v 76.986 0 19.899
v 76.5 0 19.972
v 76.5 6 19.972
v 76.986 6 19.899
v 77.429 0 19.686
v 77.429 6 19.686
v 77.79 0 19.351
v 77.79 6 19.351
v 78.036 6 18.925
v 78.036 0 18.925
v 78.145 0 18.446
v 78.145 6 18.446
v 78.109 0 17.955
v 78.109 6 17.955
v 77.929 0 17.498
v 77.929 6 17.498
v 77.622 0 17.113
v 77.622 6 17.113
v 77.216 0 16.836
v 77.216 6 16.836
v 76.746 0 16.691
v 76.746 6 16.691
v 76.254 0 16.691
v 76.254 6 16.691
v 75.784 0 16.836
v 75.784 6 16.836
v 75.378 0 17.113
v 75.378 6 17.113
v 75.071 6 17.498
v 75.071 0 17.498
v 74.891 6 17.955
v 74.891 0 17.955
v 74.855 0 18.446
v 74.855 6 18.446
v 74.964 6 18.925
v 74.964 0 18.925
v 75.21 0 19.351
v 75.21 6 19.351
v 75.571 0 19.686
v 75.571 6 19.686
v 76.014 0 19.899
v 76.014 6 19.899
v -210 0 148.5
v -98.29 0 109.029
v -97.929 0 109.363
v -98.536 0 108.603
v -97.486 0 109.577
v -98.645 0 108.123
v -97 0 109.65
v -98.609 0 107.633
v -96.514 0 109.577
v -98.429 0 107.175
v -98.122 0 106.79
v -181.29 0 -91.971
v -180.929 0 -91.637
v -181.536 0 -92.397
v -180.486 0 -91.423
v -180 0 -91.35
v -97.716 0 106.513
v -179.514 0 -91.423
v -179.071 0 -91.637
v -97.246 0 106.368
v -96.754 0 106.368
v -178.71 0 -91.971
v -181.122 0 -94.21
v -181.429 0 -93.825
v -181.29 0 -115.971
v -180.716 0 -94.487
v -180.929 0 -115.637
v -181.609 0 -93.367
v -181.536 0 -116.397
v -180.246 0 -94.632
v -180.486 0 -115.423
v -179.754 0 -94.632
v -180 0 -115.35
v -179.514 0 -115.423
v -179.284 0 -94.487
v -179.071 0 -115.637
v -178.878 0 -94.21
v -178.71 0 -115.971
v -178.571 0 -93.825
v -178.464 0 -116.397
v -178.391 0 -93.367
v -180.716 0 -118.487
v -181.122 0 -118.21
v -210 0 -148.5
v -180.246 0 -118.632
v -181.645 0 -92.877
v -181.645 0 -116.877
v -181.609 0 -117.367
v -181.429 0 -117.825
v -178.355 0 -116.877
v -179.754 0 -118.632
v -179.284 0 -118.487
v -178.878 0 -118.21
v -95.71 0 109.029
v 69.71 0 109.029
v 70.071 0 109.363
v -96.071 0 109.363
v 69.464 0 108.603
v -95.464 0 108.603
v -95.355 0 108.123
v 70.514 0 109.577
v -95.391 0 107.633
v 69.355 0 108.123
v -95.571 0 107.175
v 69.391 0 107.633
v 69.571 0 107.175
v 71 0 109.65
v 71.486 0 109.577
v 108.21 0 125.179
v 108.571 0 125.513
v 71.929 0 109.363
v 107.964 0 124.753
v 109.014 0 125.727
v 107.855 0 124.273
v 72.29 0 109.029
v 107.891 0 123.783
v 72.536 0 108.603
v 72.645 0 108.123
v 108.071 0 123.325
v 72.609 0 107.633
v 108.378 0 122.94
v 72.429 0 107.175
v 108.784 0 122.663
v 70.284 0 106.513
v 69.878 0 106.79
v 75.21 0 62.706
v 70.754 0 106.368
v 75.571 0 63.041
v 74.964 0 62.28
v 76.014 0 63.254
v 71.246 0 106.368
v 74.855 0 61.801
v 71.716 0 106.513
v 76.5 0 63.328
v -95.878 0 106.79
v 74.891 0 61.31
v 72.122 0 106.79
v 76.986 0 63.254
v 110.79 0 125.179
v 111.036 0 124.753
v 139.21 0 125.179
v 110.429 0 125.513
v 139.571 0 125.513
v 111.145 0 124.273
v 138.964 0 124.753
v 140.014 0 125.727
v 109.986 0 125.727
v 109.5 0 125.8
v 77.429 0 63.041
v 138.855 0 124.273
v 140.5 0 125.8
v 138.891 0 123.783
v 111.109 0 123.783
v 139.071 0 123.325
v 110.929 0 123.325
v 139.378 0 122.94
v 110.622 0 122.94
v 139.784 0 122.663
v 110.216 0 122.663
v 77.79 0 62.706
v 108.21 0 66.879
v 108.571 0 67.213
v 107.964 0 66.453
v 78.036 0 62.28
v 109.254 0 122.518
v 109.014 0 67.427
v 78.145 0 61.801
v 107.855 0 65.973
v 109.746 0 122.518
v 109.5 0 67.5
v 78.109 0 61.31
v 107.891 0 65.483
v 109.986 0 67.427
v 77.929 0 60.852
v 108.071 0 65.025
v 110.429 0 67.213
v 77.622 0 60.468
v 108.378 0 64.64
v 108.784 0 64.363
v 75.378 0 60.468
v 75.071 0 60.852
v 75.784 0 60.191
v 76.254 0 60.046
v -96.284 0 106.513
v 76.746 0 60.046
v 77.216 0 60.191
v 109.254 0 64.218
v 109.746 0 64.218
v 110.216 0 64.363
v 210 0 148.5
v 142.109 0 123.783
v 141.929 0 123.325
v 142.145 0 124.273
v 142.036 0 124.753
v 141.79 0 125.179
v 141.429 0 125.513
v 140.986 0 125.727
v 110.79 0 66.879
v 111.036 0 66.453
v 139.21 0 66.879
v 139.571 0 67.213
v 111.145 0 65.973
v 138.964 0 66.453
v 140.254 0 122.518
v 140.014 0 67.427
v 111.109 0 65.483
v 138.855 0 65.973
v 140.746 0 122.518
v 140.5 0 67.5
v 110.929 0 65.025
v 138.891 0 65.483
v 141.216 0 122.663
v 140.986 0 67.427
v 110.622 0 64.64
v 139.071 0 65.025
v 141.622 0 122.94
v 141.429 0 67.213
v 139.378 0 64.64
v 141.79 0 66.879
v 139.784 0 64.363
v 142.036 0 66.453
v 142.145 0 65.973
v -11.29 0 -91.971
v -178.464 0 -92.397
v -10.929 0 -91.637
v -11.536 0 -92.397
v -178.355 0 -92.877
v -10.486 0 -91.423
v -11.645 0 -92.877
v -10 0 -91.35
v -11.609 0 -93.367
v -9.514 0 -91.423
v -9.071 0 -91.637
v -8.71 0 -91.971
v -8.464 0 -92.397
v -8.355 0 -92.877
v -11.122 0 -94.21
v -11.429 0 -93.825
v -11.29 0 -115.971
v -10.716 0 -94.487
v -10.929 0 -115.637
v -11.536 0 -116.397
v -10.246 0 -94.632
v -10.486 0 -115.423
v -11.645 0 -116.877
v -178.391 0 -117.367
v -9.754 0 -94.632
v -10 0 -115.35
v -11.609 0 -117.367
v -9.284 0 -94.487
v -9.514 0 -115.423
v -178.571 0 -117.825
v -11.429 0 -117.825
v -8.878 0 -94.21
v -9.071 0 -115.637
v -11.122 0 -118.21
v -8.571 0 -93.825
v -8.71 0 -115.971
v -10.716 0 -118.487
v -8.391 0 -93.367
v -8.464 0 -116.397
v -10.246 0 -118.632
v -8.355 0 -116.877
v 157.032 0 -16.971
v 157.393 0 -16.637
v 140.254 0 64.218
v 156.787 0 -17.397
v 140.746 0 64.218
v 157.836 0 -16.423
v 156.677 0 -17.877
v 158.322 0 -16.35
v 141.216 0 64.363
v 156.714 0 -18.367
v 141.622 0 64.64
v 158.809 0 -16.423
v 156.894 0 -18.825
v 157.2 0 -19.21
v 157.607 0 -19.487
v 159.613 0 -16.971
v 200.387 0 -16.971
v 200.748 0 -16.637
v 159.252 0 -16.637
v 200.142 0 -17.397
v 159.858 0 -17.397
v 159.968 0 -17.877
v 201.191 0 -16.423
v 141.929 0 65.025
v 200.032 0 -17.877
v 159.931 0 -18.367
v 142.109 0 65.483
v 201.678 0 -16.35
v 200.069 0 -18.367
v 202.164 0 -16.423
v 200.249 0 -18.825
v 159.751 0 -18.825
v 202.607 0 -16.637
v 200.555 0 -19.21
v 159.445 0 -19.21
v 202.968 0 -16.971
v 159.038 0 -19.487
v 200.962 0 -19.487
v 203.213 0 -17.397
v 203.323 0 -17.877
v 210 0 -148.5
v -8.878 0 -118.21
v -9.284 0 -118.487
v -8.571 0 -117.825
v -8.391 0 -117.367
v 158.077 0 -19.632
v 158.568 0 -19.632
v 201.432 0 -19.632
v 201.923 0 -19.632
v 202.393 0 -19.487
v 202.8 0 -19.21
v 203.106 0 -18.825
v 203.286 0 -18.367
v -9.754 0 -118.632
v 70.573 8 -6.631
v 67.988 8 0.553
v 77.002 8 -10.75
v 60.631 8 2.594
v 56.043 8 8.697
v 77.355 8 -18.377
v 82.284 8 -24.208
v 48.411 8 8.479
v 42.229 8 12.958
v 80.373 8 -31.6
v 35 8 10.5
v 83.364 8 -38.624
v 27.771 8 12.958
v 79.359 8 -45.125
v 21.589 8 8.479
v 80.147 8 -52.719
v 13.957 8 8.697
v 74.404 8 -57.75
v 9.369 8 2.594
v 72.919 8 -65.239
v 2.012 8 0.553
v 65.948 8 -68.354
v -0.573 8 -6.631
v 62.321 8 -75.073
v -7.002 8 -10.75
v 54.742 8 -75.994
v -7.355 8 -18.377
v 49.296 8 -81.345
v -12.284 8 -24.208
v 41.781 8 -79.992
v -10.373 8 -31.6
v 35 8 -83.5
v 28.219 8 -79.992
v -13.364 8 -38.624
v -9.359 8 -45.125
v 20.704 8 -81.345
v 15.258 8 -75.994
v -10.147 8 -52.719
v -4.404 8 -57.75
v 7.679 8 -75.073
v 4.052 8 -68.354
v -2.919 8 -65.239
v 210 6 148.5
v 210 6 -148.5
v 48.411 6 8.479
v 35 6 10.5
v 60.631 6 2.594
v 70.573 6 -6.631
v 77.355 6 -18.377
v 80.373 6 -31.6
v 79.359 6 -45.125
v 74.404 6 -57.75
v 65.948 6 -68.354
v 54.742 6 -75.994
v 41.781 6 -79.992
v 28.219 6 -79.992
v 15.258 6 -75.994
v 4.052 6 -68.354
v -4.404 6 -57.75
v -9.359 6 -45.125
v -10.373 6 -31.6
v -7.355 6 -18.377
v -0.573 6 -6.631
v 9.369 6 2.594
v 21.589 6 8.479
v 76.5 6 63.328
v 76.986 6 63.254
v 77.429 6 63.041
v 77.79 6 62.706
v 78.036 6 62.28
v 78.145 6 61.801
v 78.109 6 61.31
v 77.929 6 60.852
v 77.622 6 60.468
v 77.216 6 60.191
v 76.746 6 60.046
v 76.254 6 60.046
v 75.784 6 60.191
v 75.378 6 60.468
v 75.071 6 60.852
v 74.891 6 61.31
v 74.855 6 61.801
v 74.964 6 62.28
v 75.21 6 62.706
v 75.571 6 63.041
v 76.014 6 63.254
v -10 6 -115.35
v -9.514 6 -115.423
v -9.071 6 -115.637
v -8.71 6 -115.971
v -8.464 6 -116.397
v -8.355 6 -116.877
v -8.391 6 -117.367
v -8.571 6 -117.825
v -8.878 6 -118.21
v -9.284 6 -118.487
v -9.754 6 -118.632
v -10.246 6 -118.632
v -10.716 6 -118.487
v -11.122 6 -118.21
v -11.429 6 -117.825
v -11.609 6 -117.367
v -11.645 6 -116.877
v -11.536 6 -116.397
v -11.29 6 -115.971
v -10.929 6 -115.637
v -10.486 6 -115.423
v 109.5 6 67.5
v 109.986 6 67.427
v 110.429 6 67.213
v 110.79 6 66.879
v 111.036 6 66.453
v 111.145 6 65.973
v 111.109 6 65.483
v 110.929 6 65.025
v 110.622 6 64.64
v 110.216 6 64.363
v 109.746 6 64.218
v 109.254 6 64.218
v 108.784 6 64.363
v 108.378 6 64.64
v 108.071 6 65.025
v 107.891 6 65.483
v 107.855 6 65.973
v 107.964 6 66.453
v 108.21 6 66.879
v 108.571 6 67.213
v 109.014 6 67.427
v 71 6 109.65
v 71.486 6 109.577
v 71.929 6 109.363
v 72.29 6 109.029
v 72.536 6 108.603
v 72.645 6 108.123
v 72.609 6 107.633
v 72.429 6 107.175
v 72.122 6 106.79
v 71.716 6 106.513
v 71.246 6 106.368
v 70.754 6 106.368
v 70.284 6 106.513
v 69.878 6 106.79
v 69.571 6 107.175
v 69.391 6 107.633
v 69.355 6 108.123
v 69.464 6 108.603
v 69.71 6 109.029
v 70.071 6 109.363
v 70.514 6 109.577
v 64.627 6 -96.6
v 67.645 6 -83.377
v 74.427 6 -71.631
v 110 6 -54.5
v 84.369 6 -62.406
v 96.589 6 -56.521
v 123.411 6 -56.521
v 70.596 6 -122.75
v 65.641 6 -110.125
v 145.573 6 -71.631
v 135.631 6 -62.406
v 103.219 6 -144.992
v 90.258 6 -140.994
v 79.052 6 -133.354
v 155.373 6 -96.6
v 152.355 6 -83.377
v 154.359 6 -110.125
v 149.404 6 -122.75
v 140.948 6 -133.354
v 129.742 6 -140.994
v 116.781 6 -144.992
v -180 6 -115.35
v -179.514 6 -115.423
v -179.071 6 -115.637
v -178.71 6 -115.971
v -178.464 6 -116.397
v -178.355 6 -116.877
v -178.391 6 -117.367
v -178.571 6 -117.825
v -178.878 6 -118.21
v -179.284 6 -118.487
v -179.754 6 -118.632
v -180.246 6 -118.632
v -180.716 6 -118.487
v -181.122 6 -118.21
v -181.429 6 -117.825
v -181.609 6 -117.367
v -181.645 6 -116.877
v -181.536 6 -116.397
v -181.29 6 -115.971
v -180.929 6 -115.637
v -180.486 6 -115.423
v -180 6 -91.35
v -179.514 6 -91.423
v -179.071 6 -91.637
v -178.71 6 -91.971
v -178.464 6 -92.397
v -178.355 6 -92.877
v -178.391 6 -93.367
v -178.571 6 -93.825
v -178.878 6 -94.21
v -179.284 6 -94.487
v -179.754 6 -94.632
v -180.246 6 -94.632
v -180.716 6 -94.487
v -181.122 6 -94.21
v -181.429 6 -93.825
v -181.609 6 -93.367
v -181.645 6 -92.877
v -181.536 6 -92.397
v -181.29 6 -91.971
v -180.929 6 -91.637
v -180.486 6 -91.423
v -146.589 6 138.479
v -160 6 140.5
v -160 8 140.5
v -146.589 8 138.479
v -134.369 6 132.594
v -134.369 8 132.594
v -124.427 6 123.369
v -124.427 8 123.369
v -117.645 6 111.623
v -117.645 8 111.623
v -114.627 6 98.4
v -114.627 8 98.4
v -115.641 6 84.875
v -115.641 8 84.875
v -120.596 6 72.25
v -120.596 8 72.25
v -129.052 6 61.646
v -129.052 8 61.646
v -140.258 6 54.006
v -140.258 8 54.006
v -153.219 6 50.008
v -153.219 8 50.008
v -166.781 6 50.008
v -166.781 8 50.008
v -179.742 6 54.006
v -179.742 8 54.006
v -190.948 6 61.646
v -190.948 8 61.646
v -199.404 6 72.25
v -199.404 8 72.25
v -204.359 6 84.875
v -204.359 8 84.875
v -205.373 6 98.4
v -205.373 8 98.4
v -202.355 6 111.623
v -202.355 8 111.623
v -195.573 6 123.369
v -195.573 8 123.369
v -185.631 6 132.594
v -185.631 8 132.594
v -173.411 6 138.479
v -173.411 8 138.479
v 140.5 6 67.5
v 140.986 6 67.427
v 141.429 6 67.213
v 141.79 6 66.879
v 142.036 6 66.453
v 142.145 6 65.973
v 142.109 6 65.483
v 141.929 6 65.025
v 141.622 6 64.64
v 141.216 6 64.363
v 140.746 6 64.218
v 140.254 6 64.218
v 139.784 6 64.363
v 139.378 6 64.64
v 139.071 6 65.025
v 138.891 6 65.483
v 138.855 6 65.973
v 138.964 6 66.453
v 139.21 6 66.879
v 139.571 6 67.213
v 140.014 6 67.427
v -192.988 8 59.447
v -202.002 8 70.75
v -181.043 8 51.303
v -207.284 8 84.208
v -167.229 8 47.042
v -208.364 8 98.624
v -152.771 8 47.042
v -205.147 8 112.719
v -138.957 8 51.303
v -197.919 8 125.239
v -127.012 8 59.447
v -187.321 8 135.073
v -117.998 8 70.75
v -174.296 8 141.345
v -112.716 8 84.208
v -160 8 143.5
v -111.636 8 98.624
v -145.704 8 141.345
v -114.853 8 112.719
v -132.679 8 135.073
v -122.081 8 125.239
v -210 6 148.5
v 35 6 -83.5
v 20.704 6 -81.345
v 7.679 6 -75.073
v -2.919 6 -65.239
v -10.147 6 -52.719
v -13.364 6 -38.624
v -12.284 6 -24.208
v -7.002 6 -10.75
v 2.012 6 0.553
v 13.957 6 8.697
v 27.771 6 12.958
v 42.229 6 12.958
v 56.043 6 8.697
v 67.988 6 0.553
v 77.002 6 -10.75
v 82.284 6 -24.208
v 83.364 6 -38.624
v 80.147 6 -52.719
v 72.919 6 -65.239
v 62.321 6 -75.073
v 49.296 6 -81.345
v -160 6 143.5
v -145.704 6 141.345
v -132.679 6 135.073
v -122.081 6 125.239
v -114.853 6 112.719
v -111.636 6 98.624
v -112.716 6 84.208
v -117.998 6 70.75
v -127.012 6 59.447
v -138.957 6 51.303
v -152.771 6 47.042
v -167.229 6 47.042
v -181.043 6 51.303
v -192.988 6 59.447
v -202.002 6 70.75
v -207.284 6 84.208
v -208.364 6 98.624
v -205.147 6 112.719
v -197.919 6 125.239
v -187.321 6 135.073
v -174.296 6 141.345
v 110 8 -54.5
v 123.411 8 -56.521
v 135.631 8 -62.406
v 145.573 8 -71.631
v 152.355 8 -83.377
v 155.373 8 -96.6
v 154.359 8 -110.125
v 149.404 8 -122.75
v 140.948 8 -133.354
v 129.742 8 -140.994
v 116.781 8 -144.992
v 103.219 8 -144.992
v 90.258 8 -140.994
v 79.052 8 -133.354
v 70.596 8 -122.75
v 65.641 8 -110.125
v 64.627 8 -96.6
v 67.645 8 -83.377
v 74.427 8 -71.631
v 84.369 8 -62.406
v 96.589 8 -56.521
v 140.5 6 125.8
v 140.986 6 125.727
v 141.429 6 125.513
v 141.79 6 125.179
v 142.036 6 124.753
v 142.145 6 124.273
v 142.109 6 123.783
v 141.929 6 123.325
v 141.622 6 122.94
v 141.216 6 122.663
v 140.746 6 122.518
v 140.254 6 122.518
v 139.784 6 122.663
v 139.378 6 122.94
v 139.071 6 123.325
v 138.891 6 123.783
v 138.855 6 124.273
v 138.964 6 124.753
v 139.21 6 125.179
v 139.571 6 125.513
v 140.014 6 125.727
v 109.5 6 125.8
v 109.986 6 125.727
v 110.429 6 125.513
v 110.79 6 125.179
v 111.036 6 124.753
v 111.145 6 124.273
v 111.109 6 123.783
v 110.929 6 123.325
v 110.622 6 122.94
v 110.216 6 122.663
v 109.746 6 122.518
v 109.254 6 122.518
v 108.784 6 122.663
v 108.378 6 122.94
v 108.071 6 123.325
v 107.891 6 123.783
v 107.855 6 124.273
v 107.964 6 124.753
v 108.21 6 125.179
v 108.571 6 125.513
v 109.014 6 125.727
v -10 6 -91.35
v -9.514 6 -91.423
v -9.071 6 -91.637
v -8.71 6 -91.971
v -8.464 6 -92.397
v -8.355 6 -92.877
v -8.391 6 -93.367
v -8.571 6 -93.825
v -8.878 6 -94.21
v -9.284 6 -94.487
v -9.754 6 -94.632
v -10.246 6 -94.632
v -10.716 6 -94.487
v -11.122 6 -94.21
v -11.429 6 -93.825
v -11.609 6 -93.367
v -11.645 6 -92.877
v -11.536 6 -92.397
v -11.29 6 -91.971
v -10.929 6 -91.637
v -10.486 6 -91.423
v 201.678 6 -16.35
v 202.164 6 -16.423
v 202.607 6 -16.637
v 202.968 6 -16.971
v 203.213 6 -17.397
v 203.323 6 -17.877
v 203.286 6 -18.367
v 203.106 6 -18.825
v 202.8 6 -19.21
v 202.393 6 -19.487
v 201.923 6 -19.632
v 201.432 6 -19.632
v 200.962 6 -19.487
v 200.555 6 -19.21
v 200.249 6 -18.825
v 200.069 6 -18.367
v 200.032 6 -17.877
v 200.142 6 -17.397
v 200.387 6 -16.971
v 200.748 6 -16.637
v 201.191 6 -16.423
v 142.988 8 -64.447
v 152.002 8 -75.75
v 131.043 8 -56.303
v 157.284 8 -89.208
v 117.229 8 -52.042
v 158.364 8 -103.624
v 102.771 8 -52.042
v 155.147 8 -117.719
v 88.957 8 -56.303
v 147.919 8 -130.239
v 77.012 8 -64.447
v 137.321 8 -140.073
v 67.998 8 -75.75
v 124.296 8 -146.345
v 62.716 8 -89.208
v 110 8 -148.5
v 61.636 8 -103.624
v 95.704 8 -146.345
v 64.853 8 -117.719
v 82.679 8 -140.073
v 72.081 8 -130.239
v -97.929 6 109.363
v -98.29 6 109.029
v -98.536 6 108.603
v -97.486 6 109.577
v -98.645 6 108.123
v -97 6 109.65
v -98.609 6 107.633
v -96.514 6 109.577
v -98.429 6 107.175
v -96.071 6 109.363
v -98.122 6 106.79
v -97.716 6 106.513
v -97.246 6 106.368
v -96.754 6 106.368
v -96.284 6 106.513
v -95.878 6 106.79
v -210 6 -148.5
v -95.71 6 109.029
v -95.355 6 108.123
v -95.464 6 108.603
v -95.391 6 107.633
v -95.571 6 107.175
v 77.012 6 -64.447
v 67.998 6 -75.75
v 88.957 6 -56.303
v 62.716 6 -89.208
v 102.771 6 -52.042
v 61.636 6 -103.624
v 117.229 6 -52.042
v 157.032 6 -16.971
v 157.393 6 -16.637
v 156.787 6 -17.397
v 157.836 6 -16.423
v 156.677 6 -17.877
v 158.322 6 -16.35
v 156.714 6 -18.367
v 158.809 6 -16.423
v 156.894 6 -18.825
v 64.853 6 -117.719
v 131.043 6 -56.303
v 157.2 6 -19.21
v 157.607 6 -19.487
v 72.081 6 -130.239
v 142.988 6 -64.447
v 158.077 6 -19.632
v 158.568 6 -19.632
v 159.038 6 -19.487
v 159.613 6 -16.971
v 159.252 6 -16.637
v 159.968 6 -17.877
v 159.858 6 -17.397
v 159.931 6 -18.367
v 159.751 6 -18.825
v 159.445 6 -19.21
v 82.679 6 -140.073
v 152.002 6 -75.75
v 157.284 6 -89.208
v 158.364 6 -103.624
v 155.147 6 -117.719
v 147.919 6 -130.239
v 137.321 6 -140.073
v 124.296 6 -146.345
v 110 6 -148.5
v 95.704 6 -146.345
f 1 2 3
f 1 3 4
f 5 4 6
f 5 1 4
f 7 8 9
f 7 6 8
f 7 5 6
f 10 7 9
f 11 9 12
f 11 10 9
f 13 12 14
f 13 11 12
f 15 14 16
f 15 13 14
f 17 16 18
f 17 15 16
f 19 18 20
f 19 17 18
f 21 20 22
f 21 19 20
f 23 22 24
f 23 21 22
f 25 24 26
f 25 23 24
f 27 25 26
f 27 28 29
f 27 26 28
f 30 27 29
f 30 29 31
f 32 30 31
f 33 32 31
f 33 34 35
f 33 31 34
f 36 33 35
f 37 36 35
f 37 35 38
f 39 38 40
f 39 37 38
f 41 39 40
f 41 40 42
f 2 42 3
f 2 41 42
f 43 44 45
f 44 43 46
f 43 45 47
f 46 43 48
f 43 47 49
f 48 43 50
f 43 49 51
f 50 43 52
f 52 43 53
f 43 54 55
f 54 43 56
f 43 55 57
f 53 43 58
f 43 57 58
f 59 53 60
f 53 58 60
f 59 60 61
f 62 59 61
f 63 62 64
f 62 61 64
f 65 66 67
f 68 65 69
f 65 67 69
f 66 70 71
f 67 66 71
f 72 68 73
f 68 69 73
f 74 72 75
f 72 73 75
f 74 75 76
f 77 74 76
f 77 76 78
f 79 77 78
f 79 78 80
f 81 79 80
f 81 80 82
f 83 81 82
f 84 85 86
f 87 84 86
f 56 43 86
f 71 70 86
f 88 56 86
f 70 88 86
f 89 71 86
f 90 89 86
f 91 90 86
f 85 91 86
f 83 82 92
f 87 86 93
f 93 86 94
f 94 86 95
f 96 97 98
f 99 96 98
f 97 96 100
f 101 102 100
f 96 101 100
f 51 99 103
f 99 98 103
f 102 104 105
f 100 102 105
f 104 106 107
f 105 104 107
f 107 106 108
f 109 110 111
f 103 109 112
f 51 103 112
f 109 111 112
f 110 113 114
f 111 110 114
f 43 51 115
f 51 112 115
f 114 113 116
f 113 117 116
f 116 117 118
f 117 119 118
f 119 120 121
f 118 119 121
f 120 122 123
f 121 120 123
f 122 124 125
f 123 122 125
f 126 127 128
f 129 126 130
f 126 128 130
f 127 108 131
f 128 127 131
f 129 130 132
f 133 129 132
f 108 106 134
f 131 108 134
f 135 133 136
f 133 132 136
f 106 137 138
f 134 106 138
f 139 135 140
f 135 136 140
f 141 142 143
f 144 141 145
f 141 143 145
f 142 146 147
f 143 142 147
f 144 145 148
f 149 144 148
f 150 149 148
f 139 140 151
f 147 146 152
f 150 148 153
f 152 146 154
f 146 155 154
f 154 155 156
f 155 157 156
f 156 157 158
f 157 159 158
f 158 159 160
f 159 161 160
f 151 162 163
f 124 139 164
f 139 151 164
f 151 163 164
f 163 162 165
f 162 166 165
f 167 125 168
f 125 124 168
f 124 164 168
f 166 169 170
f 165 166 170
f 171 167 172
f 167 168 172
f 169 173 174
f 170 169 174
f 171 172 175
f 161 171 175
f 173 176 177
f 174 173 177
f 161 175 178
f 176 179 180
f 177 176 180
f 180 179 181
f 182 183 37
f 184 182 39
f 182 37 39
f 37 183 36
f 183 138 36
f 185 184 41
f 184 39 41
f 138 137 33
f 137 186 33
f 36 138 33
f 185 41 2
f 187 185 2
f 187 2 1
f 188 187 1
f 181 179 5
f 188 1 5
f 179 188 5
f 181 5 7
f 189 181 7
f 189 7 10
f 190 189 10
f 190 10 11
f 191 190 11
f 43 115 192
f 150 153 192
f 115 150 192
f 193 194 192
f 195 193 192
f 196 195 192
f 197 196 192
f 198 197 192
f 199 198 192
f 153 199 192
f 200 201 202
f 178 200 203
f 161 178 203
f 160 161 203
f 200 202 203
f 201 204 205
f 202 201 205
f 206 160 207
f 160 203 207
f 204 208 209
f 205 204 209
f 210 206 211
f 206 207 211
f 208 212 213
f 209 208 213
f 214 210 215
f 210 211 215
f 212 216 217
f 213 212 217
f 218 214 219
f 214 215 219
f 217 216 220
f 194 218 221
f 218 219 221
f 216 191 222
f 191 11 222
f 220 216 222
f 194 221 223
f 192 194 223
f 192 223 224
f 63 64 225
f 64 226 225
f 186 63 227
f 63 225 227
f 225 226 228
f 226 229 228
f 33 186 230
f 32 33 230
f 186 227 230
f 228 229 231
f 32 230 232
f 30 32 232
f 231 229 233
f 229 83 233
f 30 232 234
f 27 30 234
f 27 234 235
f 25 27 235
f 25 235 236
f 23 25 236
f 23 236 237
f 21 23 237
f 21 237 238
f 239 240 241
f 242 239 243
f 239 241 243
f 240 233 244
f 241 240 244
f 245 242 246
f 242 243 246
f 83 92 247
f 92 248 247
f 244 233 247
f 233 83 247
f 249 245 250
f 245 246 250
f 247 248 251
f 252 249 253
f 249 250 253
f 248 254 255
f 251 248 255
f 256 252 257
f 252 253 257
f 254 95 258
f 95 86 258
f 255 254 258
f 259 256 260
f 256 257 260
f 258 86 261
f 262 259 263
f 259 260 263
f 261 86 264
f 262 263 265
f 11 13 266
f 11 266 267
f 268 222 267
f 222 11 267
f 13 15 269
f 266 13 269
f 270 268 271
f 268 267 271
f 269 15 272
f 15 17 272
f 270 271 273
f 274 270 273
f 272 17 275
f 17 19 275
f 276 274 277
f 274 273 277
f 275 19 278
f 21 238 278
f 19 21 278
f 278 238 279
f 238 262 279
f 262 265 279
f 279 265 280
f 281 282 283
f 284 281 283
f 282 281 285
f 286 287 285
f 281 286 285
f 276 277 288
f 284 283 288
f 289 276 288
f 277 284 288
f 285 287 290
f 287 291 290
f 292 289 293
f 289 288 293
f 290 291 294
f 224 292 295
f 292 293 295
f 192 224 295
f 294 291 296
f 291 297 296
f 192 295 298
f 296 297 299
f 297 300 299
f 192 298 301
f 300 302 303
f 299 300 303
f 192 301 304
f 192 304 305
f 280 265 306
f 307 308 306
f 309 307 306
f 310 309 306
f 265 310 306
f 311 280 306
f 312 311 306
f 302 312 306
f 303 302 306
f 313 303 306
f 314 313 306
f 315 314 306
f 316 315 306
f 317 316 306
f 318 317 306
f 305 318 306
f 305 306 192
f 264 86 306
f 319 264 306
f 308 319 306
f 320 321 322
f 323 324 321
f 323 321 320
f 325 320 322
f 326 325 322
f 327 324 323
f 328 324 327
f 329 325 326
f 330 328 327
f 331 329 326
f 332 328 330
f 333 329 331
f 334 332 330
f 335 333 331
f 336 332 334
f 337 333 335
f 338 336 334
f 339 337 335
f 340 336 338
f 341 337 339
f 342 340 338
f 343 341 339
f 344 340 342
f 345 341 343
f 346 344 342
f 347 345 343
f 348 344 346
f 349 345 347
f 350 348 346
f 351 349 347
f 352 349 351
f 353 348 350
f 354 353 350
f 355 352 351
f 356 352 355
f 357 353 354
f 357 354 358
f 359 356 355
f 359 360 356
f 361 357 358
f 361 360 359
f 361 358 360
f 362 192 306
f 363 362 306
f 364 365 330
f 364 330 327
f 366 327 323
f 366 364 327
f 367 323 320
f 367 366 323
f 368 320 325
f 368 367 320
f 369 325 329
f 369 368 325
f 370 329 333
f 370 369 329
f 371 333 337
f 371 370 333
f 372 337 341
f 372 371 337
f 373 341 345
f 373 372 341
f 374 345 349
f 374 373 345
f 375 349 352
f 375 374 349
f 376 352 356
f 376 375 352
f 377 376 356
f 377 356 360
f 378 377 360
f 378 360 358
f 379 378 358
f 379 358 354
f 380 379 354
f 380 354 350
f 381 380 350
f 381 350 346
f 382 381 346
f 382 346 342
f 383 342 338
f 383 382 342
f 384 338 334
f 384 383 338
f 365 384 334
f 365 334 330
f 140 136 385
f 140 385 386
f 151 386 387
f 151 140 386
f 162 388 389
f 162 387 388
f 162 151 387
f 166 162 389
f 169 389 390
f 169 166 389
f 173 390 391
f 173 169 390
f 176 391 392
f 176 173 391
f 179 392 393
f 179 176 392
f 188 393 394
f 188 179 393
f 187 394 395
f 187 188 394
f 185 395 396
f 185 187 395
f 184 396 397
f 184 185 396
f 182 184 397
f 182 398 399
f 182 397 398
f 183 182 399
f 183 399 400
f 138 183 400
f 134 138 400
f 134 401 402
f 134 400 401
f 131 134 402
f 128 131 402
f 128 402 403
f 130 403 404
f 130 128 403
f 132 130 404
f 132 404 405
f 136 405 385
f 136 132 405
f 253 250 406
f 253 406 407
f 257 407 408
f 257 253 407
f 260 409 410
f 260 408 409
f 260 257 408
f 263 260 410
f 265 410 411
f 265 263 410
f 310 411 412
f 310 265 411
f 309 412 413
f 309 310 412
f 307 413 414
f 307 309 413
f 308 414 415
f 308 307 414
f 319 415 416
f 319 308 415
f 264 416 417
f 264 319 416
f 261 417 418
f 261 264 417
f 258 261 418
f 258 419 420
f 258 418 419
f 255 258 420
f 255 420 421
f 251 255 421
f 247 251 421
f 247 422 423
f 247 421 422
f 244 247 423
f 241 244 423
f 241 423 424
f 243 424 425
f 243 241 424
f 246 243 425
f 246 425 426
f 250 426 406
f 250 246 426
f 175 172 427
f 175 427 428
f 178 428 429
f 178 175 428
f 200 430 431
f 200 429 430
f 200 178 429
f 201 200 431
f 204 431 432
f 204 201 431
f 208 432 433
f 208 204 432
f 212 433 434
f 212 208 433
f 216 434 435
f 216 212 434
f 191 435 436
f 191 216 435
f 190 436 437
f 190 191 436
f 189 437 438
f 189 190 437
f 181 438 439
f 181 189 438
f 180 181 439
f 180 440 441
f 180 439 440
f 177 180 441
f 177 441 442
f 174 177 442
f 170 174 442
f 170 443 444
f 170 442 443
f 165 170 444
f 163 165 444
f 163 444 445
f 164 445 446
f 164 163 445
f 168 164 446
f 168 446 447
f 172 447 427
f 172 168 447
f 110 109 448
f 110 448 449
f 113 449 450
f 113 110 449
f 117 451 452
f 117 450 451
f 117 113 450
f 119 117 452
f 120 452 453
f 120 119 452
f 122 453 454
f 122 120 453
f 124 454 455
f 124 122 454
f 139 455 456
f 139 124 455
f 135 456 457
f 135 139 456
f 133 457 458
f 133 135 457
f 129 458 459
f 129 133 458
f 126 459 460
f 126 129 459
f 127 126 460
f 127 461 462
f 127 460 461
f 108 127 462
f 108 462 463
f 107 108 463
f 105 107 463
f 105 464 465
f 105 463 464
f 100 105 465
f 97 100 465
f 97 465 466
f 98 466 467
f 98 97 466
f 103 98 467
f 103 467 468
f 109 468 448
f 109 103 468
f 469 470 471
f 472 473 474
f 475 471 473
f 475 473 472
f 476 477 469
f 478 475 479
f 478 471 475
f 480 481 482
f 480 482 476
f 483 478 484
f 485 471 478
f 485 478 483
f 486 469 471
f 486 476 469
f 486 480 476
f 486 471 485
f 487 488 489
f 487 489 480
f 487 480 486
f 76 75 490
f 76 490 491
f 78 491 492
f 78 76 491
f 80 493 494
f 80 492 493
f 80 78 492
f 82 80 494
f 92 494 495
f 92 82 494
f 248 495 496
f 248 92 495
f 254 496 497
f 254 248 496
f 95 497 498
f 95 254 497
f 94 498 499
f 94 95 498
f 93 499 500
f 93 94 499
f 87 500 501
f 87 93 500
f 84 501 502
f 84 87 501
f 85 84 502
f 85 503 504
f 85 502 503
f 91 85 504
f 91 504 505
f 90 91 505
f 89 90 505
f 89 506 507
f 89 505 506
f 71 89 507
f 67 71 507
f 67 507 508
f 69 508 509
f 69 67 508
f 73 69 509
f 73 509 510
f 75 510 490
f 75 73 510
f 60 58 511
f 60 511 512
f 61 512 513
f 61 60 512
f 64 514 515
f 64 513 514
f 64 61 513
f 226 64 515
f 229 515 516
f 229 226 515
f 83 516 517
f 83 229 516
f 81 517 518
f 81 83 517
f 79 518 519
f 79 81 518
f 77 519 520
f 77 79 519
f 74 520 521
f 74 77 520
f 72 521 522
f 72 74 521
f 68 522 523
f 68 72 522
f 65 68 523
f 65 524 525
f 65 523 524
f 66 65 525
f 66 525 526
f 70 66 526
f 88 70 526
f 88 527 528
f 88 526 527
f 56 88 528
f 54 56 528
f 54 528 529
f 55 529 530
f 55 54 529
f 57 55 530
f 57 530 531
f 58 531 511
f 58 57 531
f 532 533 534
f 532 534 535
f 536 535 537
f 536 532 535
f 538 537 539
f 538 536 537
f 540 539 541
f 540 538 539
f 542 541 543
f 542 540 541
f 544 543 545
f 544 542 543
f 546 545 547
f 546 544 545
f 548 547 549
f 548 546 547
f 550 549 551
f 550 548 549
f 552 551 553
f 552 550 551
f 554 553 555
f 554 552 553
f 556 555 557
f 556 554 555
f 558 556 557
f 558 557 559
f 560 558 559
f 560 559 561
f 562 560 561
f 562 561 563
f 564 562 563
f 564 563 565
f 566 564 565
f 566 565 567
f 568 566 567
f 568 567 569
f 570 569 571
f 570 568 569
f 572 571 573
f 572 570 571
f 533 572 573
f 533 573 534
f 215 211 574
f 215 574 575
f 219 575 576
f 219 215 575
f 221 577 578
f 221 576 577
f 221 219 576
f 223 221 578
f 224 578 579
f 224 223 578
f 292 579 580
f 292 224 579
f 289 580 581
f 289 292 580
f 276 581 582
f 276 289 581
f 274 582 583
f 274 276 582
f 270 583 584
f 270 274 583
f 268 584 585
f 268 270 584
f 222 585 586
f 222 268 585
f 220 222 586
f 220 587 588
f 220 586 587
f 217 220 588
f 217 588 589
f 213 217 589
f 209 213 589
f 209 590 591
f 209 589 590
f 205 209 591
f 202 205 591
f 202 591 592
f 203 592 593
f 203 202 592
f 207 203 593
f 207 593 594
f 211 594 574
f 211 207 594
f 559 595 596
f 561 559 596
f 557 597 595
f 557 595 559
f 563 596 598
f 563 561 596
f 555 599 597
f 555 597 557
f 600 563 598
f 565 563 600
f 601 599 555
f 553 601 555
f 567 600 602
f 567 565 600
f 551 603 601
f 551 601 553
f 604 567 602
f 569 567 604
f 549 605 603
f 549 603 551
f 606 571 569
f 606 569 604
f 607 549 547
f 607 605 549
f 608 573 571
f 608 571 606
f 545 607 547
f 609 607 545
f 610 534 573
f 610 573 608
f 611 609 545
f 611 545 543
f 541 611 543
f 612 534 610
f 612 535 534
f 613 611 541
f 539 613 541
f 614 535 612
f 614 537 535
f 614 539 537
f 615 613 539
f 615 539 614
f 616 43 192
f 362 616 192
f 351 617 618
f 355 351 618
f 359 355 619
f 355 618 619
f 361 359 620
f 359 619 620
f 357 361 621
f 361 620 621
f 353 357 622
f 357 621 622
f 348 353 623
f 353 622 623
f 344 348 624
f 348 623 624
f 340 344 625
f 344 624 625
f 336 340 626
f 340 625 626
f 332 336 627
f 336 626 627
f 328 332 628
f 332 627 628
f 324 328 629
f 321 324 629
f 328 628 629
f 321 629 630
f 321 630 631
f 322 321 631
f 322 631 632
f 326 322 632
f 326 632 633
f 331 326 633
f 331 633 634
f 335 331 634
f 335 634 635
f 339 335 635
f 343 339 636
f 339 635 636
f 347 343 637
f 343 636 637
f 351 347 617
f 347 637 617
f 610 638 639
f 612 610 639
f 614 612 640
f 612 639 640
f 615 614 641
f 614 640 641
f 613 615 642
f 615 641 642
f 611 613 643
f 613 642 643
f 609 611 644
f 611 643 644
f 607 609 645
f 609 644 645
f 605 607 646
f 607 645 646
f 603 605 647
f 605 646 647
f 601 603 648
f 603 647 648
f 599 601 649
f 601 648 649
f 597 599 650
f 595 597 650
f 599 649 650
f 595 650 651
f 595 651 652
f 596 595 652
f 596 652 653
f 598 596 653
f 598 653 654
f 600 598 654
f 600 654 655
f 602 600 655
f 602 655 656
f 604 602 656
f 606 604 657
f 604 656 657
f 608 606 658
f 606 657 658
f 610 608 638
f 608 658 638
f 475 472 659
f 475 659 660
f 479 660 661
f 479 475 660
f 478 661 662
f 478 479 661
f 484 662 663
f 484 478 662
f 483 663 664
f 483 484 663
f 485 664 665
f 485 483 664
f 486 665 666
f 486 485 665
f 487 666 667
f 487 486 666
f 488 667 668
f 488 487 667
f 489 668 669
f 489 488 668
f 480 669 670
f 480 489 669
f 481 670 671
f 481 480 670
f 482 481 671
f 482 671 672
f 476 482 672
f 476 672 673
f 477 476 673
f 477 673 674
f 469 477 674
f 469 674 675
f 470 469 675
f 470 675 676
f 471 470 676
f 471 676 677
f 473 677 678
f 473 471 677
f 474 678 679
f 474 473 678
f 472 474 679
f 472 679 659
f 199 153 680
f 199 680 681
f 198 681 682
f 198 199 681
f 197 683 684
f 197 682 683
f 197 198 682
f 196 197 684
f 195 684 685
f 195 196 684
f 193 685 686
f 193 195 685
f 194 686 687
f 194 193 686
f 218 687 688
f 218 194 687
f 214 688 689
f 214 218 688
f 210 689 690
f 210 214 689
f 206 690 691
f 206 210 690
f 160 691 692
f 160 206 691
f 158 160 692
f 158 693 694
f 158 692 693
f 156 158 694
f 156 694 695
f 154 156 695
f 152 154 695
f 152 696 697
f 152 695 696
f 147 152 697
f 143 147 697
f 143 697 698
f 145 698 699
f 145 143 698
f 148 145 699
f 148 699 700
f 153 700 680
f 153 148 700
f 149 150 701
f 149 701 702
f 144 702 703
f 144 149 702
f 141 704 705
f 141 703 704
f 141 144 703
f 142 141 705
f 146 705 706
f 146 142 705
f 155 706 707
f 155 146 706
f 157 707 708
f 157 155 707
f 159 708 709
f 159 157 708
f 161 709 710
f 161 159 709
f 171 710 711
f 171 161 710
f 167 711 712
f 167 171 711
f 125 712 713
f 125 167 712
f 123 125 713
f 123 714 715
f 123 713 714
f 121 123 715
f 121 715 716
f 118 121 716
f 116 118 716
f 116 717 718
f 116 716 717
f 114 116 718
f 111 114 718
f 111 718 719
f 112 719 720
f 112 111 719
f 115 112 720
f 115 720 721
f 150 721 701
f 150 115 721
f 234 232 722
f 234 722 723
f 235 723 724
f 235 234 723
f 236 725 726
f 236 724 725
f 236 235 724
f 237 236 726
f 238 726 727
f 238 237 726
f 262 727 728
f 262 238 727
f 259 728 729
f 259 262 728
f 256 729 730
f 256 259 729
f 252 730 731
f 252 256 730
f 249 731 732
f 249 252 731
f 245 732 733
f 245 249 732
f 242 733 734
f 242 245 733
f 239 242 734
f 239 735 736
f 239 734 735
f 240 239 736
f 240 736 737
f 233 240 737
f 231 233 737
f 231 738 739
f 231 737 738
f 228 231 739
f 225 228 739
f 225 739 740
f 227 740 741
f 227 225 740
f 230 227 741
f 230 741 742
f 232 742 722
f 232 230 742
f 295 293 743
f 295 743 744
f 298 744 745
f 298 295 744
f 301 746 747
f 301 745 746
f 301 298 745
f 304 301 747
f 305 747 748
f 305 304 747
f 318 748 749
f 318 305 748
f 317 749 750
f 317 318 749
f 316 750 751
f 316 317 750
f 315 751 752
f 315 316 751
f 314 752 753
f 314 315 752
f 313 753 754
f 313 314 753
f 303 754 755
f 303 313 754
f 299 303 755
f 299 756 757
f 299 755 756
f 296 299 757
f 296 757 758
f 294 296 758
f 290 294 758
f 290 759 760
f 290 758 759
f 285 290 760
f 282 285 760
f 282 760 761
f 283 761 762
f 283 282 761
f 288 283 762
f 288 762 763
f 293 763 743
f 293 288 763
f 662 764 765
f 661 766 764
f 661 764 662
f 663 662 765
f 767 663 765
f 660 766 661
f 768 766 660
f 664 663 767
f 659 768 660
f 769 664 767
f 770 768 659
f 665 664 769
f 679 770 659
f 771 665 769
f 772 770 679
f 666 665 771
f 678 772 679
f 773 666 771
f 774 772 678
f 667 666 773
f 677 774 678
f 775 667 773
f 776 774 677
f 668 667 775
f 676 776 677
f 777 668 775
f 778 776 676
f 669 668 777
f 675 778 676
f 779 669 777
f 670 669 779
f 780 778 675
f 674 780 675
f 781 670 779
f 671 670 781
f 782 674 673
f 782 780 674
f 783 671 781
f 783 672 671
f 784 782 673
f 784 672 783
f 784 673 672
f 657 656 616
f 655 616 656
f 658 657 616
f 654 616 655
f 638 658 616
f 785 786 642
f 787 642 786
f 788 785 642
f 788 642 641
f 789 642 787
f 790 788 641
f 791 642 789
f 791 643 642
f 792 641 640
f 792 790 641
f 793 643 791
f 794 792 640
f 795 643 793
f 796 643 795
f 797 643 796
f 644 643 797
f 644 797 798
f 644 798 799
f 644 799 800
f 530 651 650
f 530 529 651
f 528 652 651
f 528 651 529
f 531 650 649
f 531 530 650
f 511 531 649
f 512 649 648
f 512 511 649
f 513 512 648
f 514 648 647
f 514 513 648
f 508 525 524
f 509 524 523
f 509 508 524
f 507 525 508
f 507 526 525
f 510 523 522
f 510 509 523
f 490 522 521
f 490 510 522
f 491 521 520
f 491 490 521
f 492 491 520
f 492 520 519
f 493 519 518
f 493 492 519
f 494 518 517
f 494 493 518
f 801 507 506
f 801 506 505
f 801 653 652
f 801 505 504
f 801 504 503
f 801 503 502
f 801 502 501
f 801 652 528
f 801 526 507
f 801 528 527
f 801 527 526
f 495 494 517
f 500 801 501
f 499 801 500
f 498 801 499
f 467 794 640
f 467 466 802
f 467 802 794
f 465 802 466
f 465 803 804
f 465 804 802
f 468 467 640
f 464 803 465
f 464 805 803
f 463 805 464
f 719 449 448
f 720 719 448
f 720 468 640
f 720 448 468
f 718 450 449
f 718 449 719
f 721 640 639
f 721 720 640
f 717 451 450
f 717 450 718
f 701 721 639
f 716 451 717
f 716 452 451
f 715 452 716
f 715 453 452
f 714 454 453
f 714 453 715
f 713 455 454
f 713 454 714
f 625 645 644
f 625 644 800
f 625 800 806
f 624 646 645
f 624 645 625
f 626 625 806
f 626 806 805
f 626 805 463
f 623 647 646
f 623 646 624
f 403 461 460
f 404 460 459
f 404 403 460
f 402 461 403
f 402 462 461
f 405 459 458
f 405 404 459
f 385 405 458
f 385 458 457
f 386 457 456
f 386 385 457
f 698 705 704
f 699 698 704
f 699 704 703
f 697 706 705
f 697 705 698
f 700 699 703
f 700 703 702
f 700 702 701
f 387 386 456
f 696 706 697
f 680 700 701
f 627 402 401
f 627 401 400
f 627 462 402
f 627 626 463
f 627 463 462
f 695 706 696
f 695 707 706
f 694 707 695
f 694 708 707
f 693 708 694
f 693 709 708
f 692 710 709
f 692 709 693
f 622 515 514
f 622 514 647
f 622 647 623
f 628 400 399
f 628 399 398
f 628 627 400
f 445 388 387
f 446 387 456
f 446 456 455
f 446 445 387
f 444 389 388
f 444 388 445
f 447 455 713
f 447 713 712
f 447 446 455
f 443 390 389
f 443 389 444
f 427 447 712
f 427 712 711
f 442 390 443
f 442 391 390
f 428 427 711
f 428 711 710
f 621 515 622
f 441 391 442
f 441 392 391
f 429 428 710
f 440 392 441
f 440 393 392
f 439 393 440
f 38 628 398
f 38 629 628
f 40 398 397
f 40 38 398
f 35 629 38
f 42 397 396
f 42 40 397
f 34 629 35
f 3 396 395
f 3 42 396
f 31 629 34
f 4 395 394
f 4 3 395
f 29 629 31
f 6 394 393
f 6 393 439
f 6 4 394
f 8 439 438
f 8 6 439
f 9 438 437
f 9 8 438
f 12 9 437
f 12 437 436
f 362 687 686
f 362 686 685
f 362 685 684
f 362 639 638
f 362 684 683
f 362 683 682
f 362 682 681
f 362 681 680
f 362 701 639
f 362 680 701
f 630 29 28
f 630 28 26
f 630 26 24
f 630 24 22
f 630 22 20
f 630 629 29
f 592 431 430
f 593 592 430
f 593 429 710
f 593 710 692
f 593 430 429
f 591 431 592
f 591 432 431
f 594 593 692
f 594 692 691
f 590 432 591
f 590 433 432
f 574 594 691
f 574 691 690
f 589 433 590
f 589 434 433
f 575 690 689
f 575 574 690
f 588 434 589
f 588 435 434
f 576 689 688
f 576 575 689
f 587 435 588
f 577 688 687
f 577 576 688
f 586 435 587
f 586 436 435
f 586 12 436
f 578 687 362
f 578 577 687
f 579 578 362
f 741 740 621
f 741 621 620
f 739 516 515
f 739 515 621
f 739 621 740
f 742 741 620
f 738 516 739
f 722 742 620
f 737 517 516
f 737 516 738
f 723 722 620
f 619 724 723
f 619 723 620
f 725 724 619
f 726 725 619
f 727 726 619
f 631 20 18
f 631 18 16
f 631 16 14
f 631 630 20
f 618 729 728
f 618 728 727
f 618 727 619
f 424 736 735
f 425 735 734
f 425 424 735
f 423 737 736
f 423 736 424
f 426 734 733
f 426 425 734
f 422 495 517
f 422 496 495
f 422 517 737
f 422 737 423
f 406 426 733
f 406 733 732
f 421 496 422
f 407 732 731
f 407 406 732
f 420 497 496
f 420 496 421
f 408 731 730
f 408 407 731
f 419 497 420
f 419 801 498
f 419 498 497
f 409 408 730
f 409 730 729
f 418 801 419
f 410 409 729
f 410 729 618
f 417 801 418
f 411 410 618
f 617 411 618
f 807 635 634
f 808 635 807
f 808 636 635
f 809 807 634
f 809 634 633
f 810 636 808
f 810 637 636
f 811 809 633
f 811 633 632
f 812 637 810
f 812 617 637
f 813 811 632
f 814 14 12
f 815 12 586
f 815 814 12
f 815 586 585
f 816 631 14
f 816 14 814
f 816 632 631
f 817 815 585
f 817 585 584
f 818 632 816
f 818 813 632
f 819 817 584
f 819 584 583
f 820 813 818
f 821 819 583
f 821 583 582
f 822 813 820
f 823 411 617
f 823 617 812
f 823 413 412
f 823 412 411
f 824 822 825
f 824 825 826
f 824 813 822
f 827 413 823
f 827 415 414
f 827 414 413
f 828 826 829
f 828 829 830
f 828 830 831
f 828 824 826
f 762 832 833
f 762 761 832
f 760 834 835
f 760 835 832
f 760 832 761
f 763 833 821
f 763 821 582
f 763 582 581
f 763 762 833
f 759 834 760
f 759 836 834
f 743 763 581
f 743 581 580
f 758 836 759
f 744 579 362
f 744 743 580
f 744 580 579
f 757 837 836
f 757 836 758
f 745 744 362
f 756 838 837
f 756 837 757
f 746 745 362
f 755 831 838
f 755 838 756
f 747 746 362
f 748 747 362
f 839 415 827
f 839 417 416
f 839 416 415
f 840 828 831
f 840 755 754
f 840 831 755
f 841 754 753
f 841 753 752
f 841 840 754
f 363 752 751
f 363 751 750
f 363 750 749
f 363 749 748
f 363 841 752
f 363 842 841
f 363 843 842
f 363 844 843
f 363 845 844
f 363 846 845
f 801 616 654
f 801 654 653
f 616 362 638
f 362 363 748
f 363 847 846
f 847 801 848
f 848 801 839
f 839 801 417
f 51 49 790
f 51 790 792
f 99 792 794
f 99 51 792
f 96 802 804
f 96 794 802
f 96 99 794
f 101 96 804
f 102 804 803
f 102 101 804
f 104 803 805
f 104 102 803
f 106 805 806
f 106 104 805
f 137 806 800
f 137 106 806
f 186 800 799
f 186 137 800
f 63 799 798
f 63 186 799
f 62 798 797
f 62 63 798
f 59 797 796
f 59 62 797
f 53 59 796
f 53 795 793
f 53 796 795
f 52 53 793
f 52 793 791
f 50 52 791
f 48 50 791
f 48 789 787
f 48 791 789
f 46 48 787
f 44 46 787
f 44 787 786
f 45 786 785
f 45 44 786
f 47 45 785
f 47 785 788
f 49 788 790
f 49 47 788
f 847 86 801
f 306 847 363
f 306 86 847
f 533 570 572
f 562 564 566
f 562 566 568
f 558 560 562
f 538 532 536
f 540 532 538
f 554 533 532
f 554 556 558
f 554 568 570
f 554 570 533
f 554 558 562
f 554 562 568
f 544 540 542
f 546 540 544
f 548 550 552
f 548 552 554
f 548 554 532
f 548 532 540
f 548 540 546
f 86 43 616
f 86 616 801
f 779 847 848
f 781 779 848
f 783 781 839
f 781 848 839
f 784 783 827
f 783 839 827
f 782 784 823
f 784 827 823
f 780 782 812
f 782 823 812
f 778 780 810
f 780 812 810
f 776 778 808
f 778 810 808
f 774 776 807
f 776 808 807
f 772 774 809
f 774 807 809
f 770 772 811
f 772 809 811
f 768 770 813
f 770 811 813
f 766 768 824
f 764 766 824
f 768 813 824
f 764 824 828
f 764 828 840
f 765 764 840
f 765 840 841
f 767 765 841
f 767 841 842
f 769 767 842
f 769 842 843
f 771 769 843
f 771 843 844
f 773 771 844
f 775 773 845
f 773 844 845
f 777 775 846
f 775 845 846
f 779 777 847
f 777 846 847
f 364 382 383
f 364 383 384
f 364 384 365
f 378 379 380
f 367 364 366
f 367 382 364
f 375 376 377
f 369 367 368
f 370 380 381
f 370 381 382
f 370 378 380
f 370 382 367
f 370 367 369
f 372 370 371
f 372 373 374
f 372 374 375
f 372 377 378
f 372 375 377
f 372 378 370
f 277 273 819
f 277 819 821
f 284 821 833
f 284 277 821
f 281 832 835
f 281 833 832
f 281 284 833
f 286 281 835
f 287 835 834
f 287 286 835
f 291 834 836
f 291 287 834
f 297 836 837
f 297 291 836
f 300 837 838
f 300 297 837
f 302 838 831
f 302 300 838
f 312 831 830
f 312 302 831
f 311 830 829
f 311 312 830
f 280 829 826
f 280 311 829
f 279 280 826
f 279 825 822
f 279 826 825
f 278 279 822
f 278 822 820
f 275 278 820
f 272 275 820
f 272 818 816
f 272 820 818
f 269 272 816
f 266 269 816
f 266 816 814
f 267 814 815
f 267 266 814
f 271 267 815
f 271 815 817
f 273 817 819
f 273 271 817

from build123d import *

# Parameters (mm, degrees)
SKETCH1_W                  = 420
SKETCH1_H                  = 297
PLATE_DEPTH                = 6
TAPPED_HOLES_M4_DEPTH      = 258.270771756
TAPPED_HOLES_M4_DEPTH_BACK = 258.270771756
SKETCH2_R                  = 1.65
JAR_LOCATING_RINGS_START   = 6
SKETCH3_R                  = 48.5
SKETCH3_R_2                = 45.5
JAR_LOCATING_RINGS_DEPTH   = 2


with BuildPart() as part:
    # Sketch1 → Plate (new body)
    with BuildSketch(Plane(origin=(0, 0, 0), x_dir=(1, 0, 0), z_dir=(0, 1, 0))):
        Rectangle(SKETCH1_W, SKETCH1_H)
    extrude(amount=PLATE_DEPTH)

    # Sketch2 → Tapped_Holes_M4 (cut, two sides: drawn at the far end of the back side and taken through both)
    with BuildSketch(Plane(origin=(0, 0, 0), x_dir=(1, 0, 0), z_dir=(0, 1, 0)).offset(-TAPPED_HOLES_M4_DEPTH_BACK)):
        with Locations(Location((-97, -108, 0), (0, 0, 270))):
            Circle(SKETCH2_R)
        with Locations(Location((71, -108, 0), (0, 0, 270))):
            Circle(SKETCH2_R)
        with Locations(Location((-180, 117, 0), (0, 0, 270))):
            Circle(SKETCH2_R)
        with Locations(Location((-180, 93, 0), (0, 0, 270))):
            Circle(SKETCH2_R)
        with Locations(Location((-10, 117, 0), (0, 0, 270))):
            Circle(SKETCH2_R)
        with Locations(Location((-10, 93, 0), (0, 0, 270))):
            Circle(SKETCH2_R)
        with Locations(Location((109.5, -65.85, 0), (0, 0, 270))):
            Circle(SKETCH2_R)
        with Locations(Location((109.5, -124.15, 0), (0, 0, 270))):
            Circle(SKETCH2_R)
        with Locations(Location((140.5, -65.85, 0), (0, 0, 270))):
            Circle(SKETCH2_R)
        with Locations(Location((140.5, -124.15, 0), (0, 0, 270))):
            Circle(SKETCH2_R)
        with Locations(Location((158.3225, 18, 0), (0, 0, 270))):
            Circle(SKETCH2_R)
        with Locations(Location((201.6775, 18, 0), (0, 0, 270))):
            Circle(SKETCH2_R)
        with Locations(Location((76.5, -18.3225, 0), (0, 0, 270))):
            Circle(SKETCH2_R)
        with Locations(Location((76.5, -61.6775, 0), (0, 0, 270))):
            Circle(SKETCH2_R)
    extrude(amount=TAPPED_HOLES_M4_DEPTH + TAPPED_HOLES_M4_DEPTH_BACK, mode=Mode.SUBTRACT)

    # Sketch3 → Jar_Locating_Rings (add)
    # profile 1 of 3: a face of its own
    with BuildSketch(Plane(origin=(0, 0, 0), x_dir=(1, 0, 0), z_dir=(0, 1, 0)).offset(JAR_LOCATING_RINGS_START)):
        with Locations(Location((-160, -95, 0), (0, 0, 270))):
            Circle(SKETCH3_R)
        with Locations(Location((-160, -95, 0), (0, 0, 270))):
            Circle(SKETCH3_R_2, mode=Mode.SUBTRACT)
    # profile 2 of 3: a face of its own
    with BuildSketch(Plane(origin=(0, 0, 0), x_dir=(1, 0, 0), z_dir=(0, 1, 0)).offset(JAR_LOCATING_RINGS_START)):
        with Locations(Location((35, 35, 0), (0, 0, 90))):
            Circle(SKETCH3_R)
        with Locations(Location((35, 35, 0), (0, 0, 270))):
            Circle(SKETCH3_R_2, mode=Mode.SUBTRACT)
    # profile 3 of 3: a face of its own
    with BuildSketch(Plane(origin=(0, 0, 0), x_dir=(1, 0, 0), z_dir=(0, 1, 0)).offset(JAR_LOCATING_RINGS_START)):
        with Locations(Location((110, 100, 0), (0, 0, 90))):
            Circle(SKETCH3_R)
        with Locations(Location((110, 100, 0), (0, 0, 270))):
            Circle(SKETCH3_R_2, mode=Mode.SUBTRACT)
    extrude(amount=JAR_LOCATING_RINGS_DEPTH)


solid = part.part
